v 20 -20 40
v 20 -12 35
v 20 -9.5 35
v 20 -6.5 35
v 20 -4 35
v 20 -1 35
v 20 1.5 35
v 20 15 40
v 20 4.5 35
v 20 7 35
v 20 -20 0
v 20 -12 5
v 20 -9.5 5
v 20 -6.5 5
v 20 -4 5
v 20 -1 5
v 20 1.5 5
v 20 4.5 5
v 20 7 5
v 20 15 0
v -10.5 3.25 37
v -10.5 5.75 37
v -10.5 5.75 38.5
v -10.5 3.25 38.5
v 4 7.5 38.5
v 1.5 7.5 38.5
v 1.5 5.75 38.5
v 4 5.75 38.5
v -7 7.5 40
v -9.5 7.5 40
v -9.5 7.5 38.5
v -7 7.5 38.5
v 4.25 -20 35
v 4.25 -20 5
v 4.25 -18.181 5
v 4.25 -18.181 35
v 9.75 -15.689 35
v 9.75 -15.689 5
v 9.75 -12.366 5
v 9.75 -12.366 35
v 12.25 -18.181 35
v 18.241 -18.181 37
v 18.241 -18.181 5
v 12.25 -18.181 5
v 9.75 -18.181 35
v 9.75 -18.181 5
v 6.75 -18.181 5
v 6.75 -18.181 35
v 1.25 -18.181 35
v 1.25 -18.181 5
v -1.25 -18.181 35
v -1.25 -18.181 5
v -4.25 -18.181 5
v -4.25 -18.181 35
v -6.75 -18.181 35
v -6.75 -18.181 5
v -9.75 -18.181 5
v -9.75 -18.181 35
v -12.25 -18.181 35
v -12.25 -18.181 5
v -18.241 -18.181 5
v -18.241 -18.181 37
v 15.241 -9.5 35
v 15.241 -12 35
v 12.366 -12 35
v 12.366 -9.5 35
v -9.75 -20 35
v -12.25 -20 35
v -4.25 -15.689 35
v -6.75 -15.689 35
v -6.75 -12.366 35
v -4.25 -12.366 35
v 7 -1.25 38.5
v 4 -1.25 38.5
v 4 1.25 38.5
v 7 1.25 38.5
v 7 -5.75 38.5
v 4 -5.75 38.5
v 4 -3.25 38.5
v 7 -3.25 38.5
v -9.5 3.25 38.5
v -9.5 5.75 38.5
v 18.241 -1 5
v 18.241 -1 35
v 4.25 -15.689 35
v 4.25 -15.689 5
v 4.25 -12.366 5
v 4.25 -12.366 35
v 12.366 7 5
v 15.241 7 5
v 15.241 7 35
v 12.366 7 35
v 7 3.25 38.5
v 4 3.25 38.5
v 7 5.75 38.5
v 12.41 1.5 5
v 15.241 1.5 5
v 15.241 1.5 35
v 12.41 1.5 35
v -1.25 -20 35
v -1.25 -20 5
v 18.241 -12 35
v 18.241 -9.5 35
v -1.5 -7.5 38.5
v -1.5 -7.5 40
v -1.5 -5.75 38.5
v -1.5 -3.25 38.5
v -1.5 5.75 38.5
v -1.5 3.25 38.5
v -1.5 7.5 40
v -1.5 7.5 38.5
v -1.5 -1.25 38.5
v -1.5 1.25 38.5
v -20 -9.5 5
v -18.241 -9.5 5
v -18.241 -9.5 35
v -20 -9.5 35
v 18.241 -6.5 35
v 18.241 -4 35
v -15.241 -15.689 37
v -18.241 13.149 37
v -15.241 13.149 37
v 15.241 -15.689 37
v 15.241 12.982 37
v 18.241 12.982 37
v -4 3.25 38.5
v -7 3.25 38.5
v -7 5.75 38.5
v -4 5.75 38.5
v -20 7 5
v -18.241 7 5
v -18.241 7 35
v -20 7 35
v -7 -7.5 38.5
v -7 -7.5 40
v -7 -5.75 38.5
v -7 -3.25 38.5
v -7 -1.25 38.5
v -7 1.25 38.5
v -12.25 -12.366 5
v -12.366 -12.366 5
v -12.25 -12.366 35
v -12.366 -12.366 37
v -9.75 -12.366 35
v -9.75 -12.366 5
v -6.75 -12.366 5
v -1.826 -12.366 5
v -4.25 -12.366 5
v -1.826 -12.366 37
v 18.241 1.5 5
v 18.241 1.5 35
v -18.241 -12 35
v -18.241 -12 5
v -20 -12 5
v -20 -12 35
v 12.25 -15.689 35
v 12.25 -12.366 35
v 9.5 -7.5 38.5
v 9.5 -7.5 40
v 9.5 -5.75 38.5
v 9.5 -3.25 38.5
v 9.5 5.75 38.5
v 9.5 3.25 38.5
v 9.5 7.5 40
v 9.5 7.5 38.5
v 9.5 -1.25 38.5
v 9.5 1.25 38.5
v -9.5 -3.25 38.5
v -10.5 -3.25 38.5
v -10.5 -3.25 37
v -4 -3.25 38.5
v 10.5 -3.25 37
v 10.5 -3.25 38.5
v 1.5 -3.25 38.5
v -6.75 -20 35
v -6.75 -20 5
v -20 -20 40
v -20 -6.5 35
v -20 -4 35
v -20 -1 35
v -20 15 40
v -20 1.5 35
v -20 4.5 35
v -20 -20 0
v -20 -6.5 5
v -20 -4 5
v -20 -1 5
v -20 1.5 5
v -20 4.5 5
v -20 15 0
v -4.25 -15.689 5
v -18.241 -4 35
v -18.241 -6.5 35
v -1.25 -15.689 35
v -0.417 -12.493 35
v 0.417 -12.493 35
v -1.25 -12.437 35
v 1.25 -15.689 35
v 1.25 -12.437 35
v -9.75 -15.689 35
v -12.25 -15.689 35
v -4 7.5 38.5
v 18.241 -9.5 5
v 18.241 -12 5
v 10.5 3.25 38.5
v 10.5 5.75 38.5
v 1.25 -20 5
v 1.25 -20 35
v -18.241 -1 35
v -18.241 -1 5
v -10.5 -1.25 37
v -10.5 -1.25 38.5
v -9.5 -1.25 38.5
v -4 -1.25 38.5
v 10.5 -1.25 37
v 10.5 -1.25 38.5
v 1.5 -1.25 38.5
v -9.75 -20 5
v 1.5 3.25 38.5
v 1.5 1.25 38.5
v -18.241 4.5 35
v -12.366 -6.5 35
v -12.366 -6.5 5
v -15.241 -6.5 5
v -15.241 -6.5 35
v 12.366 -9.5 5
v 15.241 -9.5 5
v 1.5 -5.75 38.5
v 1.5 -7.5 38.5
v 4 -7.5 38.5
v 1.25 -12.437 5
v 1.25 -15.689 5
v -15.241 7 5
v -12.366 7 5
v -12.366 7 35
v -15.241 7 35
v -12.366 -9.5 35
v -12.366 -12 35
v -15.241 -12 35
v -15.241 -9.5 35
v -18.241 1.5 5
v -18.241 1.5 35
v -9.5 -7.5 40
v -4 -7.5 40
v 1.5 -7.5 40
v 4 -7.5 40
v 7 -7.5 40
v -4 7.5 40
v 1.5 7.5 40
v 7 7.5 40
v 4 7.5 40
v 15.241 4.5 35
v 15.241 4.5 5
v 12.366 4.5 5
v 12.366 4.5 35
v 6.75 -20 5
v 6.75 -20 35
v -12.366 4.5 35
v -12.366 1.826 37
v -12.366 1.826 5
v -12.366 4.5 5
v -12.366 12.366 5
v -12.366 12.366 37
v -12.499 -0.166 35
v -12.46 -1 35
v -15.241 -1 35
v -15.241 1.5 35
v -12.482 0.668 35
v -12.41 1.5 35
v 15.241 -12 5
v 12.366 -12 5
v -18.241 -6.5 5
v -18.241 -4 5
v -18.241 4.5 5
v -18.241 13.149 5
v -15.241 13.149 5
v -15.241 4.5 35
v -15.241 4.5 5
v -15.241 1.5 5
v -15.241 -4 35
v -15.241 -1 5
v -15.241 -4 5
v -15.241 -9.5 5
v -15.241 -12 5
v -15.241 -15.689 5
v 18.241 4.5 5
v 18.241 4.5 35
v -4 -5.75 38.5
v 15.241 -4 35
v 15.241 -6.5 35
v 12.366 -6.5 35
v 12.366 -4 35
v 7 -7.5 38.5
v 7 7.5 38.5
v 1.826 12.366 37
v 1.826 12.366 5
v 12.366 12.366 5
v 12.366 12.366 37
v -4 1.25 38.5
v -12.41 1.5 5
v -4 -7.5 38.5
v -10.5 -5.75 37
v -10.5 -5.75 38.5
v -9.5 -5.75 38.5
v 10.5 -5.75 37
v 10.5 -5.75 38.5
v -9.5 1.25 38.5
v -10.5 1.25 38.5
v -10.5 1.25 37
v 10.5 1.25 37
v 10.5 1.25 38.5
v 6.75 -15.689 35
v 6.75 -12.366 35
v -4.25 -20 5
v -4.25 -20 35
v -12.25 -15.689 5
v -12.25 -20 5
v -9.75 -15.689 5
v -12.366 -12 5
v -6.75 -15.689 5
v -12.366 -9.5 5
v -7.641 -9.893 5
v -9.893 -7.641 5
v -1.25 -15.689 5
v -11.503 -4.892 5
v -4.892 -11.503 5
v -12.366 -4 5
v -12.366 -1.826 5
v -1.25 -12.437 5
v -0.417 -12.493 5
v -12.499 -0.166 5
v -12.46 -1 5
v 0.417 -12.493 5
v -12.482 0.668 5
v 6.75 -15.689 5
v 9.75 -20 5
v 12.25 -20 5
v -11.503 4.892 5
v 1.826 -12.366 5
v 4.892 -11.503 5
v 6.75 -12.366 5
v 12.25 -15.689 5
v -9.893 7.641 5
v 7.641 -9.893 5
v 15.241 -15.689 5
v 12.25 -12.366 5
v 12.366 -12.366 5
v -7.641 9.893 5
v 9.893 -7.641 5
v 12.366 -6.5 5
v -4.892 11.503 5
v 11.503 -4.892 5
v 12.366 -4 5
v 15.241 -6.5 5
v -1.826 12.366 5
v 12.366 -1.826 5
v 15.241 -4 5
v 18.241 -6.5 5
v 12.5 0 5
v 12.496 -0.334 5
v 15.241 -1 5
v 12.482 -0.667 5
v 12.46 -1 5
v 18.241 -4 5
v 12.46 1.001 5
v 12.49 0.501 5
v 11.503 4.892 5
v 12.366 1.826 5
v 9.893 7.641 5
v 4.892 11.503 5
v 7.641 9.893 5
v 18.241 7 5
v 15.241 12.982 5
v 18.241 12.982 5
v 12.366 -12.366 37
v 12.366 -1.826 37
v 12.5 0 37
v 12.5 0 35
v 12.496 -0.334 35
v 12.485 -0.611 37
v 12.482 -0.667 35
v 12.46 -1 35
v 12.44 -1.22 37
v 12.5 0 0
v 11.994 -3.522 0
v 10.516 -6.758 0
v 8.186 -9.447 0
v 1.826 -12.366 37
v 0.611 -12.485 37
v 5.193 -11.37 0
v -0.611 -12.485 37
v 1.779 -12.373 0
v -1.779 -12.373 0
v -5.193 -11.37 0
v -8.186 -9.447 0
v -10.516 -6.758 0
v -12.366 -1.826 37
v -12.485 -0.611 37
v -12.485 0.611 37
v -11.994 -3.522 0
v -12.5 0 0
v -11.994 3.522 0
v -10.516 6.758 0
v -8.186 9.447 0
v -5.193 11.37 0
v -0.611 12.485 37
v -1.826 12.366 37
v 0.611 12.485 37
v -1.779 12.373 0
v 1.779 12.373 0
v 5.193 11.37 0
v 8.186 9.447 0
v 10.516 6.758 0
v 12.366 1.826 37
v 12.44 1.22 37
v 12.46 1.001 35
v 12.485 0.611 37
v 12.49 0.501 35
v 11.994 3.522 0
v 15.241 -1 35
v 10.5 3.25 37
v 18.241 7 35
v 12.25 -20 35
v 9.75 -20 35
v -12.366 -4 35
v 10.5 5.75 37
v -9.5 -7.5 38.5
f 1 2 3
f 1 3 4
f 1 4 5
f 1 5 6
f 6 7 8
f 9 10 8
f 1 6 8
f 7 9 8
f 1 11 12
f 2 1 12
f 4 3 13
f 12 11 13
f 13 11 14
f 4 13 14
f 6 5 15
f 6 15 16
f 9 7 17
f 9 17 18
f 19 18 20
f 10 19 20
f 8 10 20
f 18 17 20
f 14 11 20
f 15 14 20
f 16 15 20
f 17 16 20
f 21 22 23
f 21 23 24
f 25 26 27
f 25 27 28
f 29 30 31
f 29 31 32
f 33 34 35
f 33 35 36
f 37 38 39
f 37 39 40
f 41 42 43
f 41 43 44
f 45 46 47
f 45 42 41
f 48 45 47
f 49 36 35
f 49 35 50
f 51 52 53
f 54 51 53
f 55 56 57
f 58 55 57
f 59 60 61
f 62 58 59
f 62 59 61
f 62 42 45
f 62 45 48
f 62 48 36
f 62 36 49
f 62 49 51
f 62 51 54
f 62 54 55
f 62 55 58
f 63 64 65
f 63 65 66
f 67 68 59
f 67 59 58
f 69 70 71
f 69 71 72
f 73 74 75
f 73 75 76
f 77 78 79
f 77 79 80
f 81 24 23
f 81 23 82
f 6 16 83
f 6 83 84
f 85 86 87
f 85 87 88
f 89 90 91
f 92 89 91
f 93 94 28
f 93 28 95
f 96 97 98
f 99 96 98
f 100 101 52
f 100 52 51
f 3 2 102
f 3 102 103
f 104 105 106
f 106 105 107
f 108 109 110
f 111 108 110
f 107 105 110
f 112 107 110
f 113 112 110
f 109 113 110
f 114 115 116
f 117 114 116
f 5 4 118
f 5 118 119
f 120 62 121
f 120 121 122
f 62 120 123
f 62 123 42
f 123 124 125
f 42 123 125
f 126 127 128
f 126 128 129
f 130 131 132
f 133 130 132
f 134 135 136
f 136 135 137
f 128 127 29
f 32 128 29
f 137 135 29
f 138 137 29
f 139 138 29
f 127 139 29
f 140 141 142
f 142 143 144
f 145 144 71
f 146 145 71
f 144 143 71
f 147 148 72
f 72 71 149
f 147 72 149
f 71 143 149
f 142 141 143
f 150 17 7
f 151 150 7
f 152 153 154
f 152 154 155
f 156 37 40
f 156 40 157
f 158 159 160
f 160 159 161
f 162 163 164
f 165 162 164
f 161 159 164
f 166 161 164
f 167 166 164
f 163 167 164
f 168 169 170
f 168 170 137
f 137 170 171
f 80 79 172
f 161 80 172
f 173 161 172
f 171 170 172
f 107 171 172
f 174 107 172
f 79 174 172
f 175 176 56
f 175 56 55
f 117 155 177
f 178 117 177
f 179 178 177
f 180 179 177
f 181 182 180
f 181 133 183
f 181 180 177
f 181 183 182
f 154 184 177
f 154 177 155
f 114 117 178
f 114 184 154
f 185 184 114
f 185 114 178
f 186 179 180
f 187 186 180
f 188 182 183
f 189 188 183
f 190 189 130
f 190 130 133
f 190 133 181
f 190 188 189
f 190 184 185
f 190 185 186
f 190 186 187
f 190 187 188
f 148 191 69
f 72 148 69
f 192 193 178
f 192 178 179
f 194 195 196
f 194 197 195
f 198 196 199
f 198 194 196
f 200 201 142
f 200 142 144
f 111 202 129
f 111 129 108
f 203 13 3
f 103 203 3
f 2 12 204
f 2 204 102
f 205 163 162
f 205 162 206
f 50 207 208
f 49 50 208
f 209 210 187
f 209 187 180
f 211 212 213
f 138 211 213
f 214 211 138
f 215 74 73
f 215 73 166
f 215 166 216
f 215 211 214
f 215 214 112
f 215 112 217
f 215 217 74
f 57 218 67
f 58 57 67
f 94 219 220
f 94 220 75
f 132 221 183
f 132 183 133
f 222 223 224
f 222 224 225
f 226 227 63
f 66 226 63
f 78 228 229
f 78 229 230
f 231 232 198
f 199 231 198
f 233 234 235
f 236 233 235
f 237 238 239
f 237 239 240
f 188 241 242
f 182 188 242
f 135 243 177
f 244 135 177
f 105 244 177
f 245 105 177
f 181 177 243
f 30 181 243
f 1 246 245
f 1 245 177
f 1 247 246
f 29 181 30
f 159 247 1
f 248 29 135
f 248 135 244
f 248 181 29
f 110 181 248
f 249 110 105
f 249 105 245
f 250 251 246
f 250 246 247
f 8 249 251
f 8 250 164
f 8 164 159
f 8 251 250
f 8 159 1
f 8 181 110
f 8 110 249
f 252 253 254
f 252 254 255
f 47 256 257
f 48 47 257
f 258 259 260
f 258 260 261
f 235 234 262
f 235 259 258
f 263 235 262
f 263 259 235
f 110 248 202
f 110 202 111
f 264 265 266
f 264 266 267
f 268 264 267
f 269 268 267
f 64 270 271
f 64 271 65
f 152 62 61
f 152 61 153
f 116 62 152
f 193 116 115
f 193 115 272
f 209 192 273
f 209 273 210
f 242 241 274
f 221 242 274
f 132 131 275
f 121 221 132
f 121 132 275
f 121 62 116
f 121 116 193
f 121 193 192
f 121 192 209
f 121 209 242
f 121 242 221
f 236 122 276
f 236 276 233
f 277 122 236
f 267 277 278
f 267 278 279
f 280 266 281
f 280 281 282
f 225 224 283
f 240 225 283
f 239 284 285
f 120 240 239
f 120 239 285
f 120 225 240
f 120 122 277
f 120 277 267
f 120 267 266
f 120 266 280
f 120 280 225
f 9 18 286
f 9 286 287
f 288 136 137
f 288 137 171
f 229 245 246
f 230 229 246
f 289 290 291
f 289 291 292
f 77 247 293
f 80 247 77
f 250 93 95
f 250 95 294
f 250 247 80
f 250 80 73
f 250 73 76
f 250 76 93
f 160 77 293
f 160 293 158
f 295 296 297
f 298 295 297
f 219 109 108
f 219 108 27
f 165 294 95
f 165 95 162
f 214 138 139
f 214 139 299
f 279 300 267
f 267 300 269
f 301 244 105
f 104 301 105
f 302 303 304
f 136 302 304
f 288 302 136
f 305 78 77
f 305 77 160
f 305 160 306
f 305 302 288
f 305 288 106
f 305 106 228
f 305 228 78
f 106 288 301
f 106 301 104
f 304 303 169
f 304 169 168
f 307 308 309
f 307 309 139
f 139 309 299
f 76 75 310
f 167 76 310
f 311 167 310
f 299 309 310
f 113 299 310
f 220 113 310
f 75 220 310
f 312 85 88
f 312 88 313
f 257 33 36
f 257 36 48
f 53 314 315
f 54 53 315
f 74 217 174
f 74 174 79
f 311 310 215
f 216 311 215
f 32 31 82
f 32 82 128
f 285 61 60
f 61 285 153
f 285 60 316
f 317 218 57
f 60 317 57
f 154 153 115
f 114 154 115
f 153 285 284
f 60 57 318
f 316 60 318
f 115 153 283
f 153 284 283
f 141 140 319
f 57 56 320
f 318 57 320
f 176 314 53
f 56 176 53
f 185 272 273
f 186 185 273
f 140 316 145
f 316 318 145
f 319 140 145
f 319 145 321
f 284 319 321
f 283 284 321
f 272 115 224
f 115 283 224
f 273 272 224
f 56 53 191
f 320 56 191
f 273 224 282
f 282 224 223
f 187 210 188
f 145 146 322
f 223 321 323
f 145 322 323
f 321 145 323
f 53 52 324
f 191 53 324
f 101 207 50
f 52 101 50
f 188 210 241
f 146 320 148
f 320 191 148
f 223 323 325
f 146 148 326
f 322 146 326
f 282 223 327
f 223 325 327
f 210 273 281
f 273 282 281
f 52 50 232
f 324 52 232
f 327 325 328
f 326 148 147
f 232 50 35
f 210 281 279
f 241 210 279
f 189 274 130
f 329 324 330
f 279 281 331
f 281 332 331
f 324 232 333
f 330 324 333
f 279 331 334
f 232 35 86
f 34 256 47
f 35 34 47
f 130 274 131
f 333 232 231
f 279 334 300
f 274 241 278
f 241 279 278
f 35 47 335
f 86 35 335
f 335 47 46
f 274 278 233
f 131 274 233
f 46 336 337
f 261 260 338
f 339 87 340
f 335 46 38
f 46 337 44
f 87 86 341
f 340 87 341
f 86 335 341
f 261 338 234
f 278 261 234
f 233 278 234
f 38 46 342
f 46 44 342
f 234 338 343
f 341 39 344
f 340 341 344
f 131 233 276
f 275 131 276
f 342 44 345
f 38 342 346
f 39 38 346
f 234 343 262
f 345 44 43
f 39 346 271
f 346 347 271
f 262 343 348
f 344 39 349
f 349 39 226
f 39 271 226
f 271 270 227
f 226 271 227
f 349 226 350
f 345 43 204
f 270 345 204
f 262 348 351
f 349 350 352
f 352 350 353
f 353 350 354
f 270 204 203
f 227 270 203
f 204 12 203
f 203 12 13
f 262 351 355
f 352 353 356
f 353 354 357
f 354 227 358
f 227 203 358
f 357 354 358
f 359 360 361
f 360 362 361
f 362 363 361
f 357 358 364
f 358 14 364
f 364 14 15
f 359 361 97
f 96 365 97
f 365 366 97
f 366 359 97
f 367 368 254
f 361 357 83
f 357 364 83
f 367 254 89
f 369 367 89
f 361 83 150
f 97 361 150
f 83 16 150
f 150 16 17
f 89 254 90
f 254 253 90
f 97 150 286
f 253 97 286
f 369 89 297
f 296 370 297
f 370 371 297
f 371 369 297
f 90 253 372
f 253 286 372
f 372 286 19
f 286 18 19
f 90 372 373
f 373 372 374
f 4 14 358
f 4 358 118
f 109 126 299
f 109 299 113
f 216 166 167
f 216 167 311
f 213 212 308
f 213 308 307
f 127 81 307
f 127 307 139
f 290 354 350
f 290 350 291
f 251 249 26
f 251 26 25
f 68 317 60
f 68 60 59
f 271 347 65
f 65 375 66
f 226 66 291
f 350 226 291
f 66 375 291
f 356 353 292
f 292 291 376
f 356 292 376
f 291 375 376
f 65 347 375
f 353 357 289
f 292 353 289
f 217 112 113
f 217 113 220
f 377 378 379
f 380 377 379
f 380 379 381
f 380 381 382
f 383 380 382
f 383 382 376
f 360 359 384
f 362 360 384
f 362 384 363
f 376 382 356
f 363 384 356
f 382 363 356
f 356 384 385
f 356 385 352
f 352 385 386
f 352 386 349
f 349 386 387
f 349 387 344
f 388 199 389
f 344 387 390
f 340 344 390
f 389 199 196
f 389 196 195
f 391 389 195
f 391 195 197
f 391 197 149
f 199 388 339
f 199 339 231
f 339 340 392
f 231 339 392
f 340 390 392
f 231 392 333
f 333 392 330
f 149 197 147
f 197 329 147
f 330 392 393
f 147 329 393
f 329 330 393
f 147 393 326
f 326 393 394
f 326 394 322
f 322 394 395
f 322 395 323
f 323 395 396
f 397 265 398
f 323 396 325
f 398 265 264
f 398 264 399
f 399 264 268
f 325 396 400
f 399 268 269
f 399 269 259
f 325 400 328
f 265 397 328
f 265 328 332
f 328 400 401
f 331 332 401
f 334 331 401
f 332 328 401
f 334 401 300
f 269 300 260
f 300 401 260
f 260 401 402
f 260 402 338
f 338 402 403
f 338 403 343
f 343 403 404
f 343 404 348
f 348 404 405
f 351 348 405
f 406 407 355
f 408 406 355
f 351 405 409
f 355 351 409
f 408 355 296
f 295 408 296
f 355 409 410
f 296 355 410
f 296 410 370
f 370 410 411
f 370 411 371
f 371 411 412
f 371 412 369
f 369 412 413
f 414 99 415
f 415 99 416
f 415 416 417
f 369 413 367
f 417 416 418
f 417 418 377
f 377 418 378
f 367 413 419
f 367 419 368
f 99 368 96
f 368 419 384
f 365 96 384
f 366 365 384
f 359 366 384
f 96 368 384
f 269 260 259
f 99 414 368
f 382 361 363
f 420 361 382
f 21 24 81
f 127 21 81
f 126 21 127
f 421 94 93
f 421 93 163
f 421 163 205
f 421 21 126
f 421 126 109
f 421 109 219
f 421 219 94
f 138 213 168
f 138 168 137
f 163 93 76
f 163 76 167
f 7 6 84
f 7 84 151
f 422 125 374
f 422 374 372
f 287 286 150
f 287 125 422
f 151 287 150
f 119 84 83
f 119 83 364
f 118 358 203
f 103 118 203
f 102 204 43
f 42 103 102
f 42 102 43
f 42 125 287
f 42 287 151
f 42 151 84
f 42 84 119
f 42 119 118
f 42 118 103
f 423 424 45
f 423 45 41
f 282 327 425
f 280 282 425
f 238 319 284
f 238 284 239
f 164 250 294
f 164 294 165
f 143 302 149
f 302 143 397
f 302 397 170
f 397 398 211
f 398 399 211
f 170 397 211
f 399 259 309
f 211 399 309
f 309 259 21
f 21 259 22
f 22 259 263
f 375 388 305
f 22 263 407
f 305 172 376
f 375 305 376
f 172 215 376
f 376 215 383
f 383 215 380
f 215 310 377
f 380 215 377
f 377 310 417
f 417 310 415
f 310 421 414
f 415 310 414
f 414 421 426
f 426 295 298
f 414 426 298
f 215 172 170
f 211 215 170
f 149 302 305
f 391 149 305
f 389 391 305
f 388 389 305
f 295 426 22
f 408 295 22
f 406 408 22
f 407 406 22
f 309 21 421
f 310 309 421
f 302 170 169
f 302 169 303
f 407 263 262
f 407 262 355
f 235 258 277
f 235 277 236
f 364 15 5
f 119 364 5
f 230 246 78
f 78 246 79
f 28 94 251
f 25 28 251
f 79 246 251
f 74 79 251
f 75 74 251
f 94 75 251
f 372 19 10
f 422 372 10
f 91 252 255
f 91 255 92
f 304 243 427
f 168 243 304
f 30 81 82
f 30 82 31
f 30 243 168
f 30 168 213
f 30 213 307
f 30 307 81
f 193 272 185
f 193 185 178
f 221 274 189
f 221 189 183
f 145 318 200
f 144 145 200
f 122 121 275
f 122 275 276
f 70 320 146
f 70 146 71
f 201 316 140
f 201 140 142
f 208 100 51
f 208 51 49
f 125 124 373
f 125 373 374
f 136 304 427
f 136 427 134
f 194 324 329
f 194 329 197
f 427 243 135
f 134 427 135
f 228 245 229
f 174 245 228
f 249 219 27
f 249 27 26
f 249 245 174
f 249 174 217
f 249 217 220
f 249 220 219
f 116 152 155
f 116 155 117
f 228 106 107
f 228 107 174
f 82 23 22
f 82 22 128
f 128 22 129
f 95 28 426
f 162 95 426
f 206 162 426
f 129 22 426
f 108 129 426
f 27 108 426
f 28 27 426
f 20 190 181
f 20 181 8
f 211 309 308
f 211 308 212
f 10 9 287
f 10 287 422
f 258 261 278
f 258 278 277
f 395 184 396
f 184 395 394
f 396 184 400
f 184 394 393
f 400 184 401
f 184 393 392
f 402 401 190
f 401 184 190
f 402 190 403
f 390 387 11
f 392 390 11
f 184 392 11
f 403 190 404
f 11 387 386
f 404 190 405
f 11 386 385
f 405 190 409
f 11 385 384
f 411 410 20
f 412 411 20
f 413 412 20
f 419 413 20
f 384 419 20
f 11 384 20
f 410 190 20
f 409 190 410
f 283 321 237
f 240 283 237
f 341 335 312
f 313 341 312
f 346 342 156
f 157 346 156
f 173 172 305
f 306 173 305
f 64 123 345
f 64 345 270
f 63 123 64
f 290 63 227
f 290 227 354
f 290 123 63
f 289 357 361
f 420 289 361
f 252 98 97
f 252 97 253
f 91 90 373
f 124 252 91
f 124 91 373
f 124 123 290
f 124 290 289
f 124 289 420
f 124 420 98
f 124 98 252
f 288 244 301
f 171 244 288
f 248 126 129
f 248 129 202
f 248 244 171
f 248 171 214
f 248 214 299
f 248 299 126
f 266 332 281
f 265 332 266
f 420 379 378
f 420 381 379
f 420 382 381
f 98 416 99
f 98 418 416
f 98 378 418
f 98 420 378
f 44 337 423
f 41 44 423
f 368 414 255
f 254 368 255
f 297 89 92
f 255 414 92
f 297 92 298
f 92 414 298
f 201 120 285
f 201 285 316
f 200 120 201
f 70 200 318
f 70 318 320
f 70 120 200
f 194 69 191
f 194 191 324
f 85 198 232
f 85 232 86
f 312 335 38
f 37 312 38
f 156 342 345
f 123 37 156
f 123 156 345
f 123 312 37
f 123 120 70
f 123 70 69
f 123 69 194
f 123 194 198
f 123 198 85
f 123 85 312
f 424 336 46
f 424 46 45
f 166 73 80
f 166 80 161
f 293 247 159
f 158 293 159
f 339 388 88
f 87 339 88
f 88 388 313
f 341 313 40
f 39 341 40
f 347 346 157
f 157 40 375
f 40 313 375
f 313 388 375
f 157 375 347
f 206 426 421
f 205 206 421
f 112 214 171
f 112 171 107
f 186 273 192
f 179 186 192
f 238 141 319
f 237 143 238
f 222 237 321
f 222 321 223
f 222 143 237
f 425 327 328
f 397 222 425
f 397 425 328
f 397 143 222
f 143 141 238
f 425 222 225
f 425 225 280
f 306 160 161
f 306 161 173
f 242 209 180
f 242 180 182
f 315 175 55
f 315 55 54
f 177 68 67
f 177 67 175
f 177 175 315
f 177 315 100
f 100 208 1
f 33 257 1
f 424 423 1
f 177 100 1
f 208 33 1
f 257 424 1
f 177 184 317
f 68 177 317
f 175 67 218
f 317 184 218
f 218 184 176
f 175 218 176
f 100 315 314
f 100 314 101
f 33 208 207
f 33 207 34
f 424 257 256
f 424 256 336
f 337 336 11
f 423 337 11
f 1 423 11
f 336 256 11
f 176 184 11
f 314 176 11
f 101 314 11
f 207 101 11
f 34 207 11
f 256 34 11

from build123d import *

# Parameters (mm, degrees)
SKETCH_W        = 40
SKETCH_H        = 35
PAD_DEPTH       = 40
SKETCH001_R     = 12.5
POCKET_DEPTH    = 40.001
SKETCH002_W     = 24.731892
SKETCH002_H     = 24.731892
POCKET001_DEPTH = 35
POCKET002_DEPTH = 35
SKETCH004_W     = 2.5
SKETCH004_H     = 30
POCKET003_DEPTH = 40.001
SKETCH005_W     = 2.5
SKETCH005_H     = 30
POCKET004_DEPTH = 21
SKETCH006_W     = 39.144078
SKETCH006_H     = 33.985684
PAD001_DEPTH    = 3
SKETCH007_W     = 18
SKETCH007_H     = 2
POCKET005_DEPTH = 5
SKETCH008_W     = 2.5
SKETCH008_H     = 15
POCKET006_DEPTH = 1.5
SKETCH009_W     = 21
SKETCH009_H     = 2.5
POCKET007_DEPTH = 1.5


with BuildPart() as part:
    # Sketch → Pad (new body)
    with BuildSketch(Plane.XY):
        with Locations((0, -2.5)):
            Rectangle(SKETCH_W, SKETCH_H)
    extrude(amount=PAD_DEPTH)

    # Sketch001 (on Face5 of Pad) → Pocket (cut, through all)
    with BuildSketch(Plane(origin=(0, 0, 0), x_dir=(1, 0, 0), z_dir=(0, 0, -1))):
        Circle(SKETCH001_R)
    extrude(amount=-POCKET_DEPTH, mode=Mode.SUBTRACT)

    # Sketch002 (on Face5 of Pocket) → Pocket001 (cut)
    with BuildSketch(Plane.XY.offset(40)):
        Rectangle(SKETCH002_W, SKETCH002_H)
    extrude(amount=-POCKET001_DEPTH, mode=Mode.SUBTRACT)

    # Sketch003 → Pocket002 (cut)
    with BuildSketch(Plane.XY.offset(40)):
        Polygon((-18.24138, 13.149356), (-15.24138, 13.149356), (-15.24138, -15.688641), (15.24138, -15.688641), (15.24138, 12.981641), (18.24138, 12.981641), (18.24138, -18.180522), (-18.24138, -18.180522), align=None)
    extrude(amount=-POCKET002_DEPTH, mode=Mode.SUBTRACT)

    # Sketch004 → Pocket003 (cut, through all)
    with BuildSketch(Plane.YZ.offset(20)):
        with Locations((-10.75, 20)):
            Rectangle(SKETCH004_W, SKETCH004_H)
        with Locations((-5.25, 20)):
            Rectangle(SKETCH004_W, SKETCH004_H)
        with Locations((0.25, 20)):
            Rectangle(SKETCH004_W, SKETCH004_H)
        with Locations((5.75, 20)):
            Rectangle(SKETCH004_W, SKETCH004_H)
    extrude(amount=-POCKET003_DEPTH, mode=Mode.SUBTRACT)

    # Sketch005 → Pocket004 (cut)
    with BuildSketch(Plane.XZ.offset(20)):
        with Locations((-5.5, 20)):
            Rectangle(SKETCH005_W, SKETCH005_H)
        with Locations((0, 20)):
            Rectangle(SKETCH005_W, SKETCH005_H)
        with Locations((5.5, 20)):
            Rectangle(SKETCH005_W, SKETCH005_H)
        with Locations((11, 20)):
            Rectangle(SKETCH005_W, SKETCH005_H)
        with Locations((-11, 20)):
            Rectangle(SKETCH005_W, SKETCH005_H)
    extrude(amount=-POCKET004_DEPTH, mode=Mode.SUBTRACT)

    # Sketch006 → Pad001 (join)
    with BuildSketch(Plane.XY.offset(40)):
        with Locations((0.008508, -2.623403)):
            Rectangle(SKETCH006_W, SKETCH006_H)
    extrude(amount=-PAD001_DEPTH)

    # Sketch007 (on Face89 of Pad001) → Pocket005 (cut)
    with BuildSketch(Plane.XY.offset(5)):
        with Locations((0, 5.022821)):
            Rectangle(SKETCH007_W, SKETCH007_H)
        Rectangle(SKETCH007_W, SKETCH007_H)
        with Locations((0, -5.022821)):
            Rectangle(SKETCH007_W, SKETCH007_H)
    extrude(amount=-POCKET005_DEPTH, mode=Mode.SUBTRACT)

    # Sketch008 (on Face117 of Pocket005) → Pocket006 (cut)
    with BuildSketch(Plane.XY.offset(40)):
        with Locations((-8.25, 0)):
            Rectangle(SKETCH008_W, SKETCH008_H)
        with Locations((8.25, 0)):
            Rectangle(SKETCH008_W, SKETCH008_H)
        with Locations((-2.75, 0)):
            Rectangle(SKETCH008_W, SKETCH008_H)
        with Locations((2.75, 0)):
            Rectangle(SKETCH008_W, SKETCH008_H)
    extrude(amount=-POCKET006_DEPTH, mode=Mode.SUBTRACT)

    # Sketch009 (on Face74 of Pocket006) → Pocket007 (cut)
    with BuildSketch(Plane(origin=(0, 0, 37), x_dir=(1, 0, 0), z_dir=(0, 0, -1))):
        with Locations((0, 4.5)):
            Rectangle(SKETCH009_W, SKETCH009_H)
        Rectangle(SKETCH009_W, SKETCH009_H)
        with Locations((0, -4.5)):
            Rectangle(SKETCH009_W, SKETCH009_H)
    extrude(amount=-POCKET007_DEPTH, mode=Mode.SUBTRACT)


solid = part.part
